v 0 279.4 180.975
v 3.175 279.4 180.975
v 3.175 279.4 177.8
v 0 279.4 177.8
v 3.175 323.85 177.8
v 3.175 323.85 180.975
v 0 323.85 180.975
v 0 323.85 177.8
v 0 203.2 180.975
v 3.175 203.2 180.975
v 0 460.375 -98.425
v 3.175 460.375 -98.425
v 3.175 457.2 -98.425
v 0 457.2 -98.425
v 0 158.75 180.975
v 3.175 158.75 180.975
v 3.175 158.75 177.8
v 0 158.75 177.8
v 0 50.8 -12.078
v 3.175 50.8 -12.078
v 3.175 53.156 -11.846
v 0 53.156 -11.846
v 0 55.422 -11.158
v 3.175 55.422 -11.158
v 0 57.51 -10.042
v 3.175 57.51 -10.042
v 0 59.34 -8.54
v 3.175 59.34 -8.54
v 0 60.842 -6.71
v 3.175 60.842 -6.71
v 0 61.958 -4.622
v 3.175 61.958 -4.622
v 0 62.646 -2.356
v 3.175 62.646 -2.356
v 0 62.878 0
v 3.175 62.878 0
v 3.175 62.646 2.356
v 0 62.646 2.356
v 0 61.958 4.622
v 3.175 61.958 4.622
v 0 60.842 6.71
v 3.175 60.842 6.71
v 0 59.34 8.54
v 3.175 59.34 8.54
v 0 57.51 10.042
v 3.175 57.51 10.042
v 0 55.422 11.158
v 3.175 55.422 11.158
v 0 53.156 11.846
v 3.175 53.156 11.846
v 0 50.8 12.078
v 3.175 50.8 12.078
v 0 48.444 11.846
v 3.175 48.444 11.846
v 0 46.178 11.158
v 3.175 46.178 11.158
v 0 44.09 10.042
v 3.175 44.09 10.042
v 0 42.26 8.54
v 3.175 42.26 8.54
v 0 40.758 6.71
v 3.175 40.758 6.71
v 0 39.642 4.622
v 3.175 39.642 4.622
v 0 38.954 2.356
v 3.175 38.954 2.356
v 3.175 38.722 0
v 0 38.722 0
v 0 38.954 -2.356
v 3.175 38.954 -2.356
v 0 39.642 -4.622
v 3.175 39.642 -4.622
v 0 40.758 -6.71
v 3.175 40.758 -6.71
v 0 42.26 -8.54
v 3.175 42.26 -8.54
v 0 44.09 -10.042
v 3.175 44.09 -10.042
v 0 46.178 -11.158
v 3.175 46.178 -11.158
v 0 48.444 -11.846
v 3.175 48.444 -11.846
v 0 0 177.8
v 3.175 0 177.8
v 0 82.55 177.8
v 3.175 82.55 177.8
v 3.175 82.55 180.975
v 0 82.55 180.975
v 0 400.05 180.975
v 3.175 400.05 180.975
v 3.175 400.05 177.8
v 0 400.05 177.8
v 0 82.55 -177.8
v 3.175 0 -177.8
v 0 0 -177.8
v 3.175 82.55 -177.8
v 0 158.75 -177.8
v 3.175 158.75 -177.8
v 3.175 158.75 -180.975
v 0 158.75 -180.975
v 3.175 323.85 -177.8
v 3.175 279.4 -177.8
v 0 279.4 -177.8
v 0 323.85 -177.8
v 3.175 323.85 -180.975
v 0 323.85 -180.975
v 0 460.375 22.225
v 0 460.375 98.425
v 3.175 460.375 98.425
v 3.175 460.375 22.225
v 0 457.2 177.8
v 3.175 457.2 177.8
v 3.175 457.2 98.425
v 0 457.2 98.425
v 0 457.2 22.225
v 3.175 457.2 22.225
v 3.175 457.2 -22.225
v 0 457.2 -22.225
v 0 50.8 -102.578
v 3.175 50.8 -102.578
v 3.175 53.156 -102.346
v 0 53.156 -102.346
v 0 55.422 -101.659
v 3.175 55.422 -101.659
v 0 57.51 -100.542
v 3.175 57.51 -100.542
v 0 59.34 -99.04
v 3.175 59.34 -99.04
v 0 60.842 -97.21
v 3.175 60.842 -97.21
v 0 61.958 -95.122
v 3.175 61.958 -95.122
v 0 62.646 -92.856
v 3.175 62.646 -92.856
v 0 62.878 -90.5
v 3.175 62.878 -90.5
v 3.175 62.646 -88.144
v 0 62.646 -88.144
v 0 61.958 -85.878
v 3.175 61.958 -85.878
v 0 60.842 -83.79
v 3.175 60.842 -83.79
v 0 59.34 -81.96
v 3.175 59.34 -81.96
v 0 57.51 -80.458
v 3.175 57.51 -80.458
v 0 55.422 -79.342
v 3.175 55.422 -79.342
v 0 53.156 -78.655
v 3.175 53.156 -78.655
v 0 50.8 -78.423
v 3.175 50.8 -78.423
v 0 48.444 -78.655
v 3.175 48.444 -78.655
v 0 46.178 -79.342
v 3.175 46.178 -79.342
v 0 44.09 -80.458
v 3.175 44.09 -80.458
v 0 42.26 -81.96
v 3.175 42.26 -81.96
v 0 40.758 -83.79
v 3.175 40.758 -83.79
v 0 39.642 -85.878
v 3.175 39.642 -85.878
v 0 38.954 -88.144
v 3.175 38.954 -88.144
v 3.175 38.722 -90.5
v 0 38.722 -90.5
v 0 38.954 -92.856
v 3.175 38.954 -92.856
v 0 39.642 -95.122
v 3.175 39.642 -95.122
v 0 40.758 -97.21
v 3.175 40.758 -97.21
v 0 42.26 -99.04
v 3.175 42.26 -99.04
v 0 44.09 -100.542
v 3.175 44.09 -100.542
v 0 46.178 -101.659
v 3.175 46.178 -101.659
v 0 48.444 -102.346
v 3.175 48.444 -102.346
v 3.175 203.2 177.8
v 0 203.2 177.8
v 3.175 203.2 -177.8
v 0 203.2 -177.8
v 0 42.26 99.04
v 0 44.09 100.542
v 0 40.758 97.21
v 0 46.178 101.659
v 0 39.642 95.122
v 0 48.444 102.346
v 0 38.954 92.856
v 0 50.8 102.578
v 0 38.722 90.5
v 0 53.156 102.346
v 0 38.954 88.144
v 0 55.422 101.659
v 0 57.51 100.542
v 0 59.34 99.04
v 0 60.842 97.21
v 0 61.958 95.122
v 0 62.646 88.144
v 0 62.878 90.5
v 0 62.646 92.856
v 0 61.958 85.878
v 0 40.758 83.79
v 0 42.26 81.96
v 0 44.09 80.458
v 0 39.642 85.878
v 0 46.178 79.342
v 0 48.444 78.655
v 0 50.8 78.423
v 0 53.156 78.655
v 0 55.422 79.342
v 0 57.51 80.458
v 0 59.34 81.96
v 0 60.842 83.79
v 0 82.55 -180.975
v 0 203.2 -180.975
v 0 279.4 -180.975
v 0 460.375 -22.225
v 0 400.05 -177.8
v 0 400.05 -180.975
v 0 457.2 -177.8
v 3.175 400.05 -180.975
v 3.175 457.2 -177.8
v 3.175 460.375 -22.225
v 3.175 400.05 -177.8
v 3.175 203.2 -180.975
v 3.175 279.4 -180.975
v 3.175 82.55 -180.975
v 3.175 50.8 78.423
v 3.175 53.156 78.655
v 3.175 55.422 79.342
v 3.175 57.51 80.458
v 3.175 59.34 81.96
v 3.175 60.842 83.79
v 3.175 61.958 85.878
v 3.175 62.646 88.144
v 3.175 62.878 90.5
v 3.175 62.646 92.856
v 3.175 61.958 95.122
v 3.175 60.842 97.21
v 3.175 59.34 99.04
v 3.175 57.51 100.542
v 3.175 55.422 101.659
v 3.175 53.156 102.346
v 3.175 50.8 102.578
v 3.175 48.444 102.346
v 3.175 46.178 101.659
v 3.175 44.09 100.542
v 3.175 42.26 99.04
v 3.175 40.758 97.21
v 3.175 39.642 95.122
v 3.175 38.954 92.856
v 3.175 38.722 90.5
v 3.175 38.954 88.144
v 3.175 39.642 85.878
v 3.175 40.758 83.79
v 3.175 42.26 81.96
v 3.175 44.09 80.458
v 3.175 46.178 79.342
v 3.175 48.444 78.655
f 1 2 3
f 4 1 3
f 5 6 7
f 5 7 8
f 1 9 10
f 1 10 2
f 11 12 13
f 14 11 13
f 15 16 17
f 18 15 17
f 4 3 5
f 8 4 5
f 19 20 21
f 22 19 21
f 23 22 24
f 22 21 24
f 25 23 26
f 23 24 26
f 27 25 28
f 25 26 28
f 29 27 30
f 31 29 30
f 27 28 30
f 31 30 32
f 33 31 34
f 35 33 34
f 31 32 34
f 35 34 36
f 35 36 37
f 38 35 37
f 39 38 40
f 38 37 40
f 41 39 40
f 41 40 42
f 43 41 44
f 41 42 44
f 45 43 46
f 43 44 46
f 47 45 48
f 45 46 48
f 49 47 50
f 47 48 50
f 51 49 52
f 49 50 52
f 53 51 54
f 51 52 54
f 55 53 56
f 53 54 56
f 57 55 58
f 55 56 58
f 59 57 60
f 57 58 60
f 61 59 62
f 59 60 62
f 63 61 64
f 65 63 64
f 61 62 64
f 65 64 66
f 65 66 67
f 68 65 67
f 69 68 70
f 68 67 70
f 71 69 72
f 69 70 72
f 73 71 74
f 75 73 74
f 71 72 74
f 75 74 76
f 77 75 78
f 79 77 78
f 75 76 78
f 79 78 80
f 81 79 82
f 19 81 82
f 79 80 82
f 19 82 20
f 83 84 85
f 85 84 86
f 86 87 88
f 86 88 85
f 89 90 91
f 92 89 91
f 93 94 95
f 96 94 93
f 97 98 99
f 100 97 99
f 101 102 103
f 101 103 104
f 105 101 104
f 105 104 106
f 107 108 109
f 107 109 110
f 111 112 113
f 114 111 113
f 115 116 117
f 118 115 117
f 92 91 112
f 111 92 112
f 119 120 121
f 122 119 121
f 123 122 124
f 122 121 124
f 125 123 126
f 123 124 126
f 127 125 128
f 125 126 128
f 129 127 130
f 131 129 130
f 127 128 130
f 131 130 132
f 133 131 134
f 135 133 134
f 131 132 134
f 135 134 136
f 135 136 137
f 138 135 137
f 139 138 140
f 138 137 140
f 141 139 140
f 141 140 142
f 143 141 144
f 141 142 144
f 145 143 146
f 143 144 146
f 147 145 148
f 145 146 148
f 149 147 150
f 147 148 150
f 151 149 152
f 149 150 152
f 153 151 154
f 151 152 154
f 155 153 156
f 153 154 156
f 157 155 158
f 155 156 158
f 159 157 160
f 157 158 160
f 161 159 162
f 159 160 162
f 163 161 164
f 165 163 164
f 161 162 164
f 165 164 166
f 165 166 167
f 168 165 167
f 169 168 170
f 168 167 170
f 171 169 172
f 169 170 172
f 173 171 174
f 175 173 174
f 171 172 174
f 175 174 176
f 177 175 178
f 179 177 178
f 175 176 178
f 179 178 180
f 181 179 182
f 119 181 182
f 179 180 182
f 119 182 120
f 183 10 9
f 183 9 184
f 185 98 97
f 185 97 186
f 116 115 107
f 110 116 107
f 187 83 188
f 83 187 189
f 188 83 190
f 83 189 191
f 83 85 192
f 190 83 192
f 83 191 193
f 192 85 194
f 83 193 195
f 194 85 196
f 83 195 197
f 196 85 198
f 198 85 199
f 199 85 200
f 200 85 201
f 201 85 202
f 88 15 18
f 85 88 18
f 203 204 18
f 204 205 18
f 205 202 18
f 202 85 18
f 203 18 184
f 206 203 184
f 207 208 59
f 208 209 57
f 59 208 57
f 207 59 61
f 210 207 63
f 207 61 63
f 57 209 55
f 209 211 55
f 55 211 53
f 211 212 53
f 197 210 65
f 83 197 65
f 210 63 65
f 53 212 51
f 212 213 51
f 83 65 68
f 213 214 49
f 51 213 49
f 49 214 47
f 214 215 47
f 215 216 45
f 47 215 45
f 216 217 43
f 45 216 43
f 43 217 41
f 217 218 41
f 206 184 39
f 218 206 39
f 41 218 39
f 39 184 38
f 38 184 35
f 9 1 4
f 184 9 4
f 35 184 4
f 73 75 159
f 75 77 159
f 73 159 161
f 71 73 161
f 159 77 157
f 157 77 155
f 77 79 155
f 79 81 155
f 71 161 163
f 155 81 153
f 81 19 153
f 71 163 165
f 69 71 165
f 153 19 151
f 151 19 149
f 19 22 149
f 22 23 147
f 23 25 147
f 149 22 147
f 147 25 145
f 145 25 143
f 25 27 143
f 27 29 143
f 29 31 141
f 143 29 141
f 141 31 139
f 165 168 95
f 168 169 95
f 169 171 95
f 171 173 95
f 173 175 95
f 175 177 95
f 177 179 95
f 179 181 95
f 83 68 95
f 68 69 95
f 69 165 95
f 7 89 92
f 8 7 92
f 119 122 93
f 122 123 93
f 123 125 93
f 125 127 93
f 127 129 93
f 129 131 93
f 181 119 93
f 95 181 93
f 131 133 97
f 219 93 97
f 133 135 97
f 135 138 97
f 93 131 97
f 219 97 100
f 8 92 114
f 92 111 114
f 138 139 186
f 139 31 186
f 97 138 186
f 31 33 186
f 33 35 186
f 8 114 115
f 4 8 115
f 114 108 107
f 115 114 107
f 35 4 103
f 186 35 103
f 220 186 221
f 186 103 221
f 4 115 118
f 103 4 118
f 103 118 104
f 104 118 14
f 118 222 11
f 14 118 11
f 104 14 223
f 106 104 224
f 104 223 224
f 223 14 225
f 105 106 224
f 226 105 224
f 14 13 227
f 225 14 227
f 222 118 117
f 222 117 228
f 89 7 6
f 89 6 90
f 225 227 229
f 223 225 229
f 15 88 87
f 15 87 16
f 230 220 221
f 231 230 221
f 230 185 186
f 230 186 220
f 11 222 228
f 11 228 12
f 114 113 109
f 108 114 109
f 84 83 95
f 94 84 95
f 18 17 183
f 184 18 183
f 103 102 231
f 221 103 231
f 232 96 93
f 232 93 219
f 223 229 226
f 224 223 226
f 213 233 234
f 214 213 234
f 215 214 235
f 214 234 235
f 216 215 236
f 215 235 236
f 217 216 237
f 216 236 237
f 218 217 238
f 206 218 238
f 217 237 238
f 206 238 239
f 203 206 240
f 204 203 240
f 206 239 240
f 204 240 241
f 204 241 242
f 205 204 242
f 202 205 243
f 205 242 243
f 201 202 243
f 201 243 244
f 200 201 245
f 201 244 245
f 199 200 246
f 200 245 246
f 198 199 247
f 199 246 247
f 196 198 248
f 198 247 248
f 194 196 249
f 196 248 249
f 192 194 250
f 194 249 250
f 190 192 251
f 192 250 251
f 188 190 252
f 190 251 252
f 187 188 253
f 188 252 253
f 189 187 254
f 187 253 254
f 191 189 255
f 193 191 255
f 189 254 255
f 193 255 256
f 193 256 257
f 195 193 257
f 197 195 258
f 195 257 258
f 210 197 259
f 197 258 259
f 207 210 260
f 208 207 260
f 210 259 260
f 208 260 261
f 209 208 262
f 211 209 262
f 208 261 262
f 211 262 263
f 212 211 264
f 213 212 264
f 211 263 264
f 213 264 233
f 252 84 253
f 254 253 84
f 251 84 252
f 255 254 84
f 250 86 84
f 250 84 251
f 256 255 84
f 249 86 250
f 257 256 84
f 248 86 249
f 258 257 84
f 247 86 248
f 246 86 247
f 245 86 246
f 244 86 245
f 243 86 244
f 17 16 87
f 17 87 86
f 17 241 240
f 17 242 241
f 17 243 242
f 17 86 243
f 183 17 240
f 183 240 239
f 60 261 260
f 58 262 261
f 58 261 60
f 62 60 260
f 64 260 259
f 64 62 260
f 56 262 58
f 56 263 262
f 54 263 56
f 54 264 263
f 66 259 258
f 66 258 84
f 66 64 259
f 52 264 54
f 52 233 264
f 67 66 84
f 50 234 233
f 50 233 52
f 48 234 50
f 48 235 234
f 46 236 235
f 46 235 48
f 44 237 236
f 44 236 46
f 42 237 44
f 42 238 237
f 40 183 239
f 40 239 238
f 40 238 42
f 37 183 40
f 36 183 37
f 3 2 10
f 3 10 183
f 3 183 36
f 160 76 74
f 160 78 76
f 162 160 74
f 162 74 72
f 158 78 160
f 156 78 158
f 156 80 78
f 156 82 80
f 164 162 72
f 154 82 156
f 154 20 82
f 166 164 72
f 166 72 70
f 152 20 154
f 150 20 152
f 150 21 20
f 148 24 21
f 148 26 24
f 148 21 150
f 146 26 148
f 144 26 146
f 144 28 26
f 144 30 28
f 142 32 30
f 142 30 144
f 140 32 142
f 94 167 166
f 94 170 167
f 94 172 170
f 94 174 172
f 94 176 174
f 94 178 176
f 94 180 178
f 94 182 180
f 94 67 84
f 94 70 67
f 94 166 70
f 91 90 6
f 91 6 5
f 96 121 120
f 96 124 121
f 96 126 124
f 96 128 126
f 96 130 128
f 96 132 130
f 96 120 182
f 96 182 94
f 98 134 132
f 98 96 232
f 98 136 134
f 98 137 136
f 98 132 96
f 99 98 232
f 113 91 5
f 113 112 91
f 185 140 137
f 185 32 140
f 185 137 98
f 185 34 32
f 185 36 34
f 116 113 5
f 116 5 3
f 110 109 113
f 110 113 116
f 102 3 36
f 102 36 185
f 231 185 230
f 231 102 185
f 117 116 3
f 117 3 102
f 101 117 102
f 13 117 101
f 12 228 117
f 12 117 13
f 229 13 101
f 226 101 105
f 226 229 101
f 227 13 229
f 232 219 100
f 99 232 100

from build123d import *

# Parameters (mm, degrees)
SKETCH1_W           = 361.95
SKETCH1_H           = 460.375
BOSS_EXTRUDE1_DEPTH = 3.175
SKETCH2_W           = 3.175
SKETCH2_H           = 82.55
SKETCH2_H_2         = 44.45
SKETCH2_W_2         = 22.225
SKETCH2_H_3         = 3.175
CUT_EXTRUDE1_DEPTH  = 3.175
SKETCH3_R           = 12.0777
CUT_EXTRUDE2_DEPTH  = 3.175


with BuildPart() as part:
    # Sketch1 → Boss-Extrude1 (new body)
    with BuildSketch(Plane(origin=(0, 0, 0), x_dir=(0, 0, -1), z_dir=(1, 0, 0))):
        with Locations((0, 230.1875)):
            Rectangle(SKETCH1_W, SKETCH1_H)
    extrude(amount=BOSS_EXTRUDE1_DEPTH)

    # Sketch2 → Cut-Extrude1 (cut)
    with BuildSketch(Plane(origin=(3.175, 0, 0), x_dir=(0, 0, -1), z_dir=(1, 0, 0))):
        with Locations((-179.3875, 41.275)):
            Rectangle(SKETCH2_W, SKETCH2_H)
        with Locations((-179.3875, 180.975)):
            Rectangle(SKETCH2_W, SKETCH2_H_2)
        with Locations((-179.3875, 301.625)):
            Rectangle(SKETCH2_W, SKETCH2_H_2)
        Polygon((-98.425, 460.375), (-180.975, 460.375), (-180.975, 400.05), (-177.8, 400.05), (-177.8, 457.2), (-98.425, 457.2), align=None)
        with Locations((-11.1125, 458.7875)):
            Rectangle(SKETCH2_W_2, SKETCH2_H_3)
        with Locations((11.1125, 458.7875)):
            Rectangle(SKETCH2_W_2, SKETCH2_H_3)
        Polygon((180.975, 460.375), (98.425, 460.375), (98.425, 457.2), (177.8, 457.2), (177.8, 400.05), (180.975, 400.05), align=None)
        with Locations((179.3875, 301.625)):
            Rectangle(SKETCH2_W, SKETCH2_H_2)
        with Locations((179.3875, 180.975)):
            Rectangle(SKETCH2_W, SKETCH2_H_2)
        with Locations((179.3875, 41.275)):
            Rectangle(SKETCH2_W, SKETCH2_H)
    extrude(amount=-CUT_EXTRUDE1_DEPTH, mode=Mode.SUBTRACT)

    # Sketch3 → Cut-Extrude2 (cut)
    with BuildSketch(Plane(origin=(3.175, 0, 0), x_dir=(0, 0, -1), z_dir=(1, 0, 0))):
        with Locations((0, 50.8)):
            Circle(SKETCH3_R)
        with Locations((-90.5002, 50.8)):
            Circle(SKETCH3_R)
        with Locations((90.5002, 50.8)):
            Circle(SKETCH3_R)
    extrude(amount=-CUT_EXTRUDE2_DEPTH, mode=Mode.SUBTRACT)


solid = part.part
